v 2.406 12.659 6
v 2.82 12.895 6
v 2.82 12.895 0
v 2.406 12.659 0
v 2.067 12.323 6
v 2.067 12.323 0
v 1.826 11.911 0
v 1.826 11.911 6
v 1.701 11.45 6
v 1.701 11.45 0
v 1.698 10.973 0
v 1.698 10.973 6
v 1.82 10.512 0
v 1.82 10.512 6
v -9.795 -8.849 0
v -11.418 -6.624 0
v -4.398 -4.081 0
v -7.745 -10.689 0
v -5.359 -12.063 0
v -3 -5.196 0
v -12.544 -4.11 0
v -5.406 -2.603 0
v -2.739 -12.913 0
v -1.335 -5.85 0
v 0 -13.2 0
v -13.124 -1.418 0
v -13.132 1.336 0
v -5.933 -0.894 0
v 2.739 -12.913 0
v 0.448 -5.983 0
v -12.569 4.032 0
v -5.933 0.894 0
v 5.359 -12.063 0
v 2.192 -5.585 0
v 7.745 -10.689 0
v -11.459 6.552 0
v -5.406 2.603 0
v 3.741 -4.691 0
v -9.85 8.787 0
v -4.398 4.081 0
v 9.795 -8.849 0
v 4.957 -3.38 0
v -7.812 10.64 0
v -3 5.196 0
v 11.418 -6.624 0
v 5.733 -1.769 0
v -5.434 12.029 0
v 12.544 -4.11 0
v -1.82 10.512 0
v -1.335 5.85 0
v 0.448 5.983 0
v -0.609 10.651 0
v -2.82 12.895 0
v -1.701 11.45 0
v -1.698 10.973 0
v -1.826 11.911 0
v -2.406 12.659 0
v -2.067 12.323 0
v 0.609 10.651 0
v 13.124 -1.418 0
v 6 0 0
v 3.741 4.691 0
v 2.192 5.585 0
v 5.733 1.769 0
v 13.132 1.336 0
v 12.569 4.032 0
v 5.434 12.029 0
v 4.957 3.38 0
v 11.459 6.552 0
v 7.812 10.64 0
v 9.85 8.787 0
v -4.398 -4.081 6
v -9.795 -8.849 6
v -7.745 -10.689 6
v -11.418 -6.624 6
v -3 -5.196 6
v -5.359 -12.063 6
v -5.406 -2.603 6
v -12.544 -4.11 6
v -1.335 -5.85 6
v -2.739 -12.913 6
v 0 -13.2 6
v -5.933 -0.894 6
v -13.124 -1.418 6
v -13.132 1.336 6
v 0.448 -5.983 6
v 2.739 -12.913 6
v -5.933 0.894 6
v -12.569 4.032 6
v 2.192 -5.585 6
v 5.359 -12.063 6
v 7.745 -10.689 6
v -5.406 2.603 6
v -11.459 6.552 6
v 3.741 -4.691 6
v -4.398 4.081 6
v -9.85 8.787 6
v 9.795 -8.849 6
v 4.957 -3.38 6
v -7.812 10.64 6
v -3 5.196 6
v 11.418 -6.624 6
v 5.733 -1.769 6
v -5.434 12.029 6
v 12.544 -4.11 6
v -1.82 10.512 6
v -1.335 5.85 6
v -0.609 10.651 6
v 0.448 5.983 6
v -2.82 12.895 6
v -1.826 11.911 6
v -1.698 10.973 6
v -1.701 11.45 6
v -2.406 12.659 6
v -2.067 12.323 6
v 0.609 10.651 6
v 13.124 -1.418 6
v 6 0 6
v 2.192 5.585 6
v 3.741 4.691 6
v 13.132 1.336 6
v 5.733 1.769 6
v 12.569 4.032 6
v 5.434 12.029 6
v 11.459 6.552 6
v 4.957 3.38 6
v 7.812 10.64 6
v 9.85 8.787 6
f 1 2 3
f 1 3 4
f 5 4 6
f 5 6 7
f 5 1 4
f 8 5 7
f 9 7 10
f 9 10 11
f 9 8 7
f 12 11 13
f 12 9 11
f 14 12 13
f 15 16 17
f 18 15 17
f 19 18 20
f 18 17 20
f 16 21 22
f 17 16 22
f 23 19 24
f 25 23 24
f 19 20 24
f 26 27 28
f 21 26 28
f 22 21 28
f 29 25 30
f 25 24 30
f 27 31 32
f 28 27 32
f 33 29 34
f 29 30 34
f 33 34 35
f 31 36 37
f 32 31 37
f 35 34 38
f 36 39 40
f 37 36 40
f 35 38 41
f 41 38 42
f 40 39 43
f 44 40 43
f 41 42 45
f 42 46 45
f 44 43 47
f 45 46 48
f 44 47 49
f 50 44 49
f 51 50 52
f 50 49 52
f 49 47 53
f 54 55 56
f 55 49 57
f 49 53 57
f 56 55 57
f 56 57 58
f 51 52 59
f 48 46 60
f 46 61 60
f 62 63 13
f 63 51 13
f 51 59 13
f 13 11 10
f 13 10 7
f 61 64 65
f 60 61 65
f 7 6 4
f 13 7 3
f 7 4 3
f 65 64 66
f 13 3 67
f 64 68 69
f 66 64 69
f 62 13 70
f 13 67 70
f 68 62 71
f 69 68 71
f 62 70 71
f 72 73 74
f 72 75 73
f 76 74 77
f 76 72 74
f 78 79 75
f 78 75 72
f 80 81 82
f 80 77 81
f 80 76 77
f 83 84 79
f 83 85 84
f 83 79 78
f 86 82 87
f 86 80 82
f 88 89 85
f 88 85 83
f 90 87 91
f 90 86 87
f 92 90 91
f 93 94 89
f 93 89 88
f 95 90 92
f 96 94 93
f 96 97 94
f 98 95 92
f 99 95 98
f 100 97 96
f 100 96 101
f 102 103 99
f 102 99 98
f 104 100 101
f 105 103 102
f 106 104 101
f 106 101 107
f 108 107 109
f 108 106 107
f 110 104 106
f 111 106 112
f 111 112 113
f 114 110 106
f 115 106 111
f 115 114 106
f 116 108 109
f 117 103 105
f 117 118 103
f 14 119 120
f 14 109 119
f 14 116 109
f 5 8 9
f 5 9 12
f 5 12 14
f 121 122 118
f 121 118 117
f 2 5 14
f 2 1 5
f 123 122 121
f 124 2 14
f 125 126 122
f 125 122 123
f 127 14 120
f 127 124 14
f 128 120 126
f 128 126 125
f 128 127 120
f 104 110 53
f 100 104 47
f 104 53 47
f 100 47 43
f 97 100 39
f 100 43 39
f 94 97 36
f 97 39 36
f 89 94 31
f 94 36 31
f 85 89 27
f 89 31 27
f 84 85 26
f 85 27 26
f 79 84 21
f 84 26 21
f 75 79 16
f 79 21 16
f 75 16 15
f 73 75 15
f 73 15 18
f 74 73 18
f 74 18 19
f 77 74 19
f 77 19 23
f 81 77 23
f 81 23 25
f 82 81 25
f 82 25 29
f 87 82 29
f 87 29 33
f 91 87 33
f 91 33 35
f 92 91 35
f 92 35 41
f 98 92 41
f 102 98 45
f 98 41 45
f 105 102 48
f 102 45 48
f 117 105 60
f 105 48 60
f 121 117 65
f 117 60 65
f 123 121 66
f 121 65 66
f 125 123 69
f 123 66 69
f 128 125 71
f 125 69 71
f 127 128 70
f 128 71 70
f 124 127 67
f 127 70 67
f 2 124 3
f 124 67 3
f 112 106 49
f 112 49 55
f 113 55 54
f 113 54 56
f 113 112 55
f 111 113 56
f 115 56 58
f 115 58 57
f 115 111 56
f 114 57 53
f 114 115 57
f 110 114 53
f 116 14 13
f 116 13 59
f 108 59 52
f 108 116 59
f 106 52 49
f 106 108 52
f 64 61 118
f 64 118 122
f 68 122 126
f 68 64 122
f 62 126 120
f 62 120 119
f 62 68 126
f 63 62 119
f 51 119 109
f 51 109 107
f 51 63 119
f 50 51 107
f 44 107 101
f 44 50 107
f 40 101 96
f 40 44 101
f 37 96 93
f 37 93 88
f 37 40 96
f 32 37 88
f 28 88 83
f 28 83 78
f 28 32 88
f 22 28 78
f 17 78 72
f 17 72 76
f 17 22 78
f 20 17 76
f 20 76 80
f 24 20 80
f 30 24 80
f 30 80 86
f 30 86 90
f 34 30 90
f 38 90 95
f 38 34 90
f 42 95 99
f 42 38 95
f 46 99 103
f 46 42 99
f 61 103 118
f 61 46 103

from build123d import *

# Parameters (mm, degrees)
SKETCH1_R           = 13.2
SKETCH1_R_2         = 6
BOSS_EXTRUDE1_DEPTH = 6
CUT_EXTRUDE1_DEPTH  = 7


with BuildPart() as part:
    # Sketch1 → Boss-Extrude1 (new body)
    with BuildSketch(Plane.XY):
        Circle(SKETCH1_R)
        Circle(SKETCH1_R_2, mode=Mode.SUBTRACT)
    extrude(amount=BOSS_EXTRUDE1_DEPTH)

    # Sketch2 → Cut-Extrude1 (cut, through all)
    with BuildSketch(Plane.XY.offset(6)):
        with BuildLine():
            ThreePointArc((-2.819851171, 12.895287487), (0, 13.2), (2.819851171, 12.895287487))
            ThreePointArc((2.819851171, 12.895287487), (1.826256171, 11.910750525), (1.819851171, 10.512))
            ThreePointArc((1.819851171, 10.512), (0, 10.668364555), (-1.819851171, 10.512))
            ThreePointArc((-1.819851171, 10.512), (-1.826256171, 11.910750525), (-2.819851171, 12.895287487))
        make_face()
    extrude(amount=-CUT_EXTRUDE1_DEPTH, mode=Mode.SUBTRACT)


solid = part.part
